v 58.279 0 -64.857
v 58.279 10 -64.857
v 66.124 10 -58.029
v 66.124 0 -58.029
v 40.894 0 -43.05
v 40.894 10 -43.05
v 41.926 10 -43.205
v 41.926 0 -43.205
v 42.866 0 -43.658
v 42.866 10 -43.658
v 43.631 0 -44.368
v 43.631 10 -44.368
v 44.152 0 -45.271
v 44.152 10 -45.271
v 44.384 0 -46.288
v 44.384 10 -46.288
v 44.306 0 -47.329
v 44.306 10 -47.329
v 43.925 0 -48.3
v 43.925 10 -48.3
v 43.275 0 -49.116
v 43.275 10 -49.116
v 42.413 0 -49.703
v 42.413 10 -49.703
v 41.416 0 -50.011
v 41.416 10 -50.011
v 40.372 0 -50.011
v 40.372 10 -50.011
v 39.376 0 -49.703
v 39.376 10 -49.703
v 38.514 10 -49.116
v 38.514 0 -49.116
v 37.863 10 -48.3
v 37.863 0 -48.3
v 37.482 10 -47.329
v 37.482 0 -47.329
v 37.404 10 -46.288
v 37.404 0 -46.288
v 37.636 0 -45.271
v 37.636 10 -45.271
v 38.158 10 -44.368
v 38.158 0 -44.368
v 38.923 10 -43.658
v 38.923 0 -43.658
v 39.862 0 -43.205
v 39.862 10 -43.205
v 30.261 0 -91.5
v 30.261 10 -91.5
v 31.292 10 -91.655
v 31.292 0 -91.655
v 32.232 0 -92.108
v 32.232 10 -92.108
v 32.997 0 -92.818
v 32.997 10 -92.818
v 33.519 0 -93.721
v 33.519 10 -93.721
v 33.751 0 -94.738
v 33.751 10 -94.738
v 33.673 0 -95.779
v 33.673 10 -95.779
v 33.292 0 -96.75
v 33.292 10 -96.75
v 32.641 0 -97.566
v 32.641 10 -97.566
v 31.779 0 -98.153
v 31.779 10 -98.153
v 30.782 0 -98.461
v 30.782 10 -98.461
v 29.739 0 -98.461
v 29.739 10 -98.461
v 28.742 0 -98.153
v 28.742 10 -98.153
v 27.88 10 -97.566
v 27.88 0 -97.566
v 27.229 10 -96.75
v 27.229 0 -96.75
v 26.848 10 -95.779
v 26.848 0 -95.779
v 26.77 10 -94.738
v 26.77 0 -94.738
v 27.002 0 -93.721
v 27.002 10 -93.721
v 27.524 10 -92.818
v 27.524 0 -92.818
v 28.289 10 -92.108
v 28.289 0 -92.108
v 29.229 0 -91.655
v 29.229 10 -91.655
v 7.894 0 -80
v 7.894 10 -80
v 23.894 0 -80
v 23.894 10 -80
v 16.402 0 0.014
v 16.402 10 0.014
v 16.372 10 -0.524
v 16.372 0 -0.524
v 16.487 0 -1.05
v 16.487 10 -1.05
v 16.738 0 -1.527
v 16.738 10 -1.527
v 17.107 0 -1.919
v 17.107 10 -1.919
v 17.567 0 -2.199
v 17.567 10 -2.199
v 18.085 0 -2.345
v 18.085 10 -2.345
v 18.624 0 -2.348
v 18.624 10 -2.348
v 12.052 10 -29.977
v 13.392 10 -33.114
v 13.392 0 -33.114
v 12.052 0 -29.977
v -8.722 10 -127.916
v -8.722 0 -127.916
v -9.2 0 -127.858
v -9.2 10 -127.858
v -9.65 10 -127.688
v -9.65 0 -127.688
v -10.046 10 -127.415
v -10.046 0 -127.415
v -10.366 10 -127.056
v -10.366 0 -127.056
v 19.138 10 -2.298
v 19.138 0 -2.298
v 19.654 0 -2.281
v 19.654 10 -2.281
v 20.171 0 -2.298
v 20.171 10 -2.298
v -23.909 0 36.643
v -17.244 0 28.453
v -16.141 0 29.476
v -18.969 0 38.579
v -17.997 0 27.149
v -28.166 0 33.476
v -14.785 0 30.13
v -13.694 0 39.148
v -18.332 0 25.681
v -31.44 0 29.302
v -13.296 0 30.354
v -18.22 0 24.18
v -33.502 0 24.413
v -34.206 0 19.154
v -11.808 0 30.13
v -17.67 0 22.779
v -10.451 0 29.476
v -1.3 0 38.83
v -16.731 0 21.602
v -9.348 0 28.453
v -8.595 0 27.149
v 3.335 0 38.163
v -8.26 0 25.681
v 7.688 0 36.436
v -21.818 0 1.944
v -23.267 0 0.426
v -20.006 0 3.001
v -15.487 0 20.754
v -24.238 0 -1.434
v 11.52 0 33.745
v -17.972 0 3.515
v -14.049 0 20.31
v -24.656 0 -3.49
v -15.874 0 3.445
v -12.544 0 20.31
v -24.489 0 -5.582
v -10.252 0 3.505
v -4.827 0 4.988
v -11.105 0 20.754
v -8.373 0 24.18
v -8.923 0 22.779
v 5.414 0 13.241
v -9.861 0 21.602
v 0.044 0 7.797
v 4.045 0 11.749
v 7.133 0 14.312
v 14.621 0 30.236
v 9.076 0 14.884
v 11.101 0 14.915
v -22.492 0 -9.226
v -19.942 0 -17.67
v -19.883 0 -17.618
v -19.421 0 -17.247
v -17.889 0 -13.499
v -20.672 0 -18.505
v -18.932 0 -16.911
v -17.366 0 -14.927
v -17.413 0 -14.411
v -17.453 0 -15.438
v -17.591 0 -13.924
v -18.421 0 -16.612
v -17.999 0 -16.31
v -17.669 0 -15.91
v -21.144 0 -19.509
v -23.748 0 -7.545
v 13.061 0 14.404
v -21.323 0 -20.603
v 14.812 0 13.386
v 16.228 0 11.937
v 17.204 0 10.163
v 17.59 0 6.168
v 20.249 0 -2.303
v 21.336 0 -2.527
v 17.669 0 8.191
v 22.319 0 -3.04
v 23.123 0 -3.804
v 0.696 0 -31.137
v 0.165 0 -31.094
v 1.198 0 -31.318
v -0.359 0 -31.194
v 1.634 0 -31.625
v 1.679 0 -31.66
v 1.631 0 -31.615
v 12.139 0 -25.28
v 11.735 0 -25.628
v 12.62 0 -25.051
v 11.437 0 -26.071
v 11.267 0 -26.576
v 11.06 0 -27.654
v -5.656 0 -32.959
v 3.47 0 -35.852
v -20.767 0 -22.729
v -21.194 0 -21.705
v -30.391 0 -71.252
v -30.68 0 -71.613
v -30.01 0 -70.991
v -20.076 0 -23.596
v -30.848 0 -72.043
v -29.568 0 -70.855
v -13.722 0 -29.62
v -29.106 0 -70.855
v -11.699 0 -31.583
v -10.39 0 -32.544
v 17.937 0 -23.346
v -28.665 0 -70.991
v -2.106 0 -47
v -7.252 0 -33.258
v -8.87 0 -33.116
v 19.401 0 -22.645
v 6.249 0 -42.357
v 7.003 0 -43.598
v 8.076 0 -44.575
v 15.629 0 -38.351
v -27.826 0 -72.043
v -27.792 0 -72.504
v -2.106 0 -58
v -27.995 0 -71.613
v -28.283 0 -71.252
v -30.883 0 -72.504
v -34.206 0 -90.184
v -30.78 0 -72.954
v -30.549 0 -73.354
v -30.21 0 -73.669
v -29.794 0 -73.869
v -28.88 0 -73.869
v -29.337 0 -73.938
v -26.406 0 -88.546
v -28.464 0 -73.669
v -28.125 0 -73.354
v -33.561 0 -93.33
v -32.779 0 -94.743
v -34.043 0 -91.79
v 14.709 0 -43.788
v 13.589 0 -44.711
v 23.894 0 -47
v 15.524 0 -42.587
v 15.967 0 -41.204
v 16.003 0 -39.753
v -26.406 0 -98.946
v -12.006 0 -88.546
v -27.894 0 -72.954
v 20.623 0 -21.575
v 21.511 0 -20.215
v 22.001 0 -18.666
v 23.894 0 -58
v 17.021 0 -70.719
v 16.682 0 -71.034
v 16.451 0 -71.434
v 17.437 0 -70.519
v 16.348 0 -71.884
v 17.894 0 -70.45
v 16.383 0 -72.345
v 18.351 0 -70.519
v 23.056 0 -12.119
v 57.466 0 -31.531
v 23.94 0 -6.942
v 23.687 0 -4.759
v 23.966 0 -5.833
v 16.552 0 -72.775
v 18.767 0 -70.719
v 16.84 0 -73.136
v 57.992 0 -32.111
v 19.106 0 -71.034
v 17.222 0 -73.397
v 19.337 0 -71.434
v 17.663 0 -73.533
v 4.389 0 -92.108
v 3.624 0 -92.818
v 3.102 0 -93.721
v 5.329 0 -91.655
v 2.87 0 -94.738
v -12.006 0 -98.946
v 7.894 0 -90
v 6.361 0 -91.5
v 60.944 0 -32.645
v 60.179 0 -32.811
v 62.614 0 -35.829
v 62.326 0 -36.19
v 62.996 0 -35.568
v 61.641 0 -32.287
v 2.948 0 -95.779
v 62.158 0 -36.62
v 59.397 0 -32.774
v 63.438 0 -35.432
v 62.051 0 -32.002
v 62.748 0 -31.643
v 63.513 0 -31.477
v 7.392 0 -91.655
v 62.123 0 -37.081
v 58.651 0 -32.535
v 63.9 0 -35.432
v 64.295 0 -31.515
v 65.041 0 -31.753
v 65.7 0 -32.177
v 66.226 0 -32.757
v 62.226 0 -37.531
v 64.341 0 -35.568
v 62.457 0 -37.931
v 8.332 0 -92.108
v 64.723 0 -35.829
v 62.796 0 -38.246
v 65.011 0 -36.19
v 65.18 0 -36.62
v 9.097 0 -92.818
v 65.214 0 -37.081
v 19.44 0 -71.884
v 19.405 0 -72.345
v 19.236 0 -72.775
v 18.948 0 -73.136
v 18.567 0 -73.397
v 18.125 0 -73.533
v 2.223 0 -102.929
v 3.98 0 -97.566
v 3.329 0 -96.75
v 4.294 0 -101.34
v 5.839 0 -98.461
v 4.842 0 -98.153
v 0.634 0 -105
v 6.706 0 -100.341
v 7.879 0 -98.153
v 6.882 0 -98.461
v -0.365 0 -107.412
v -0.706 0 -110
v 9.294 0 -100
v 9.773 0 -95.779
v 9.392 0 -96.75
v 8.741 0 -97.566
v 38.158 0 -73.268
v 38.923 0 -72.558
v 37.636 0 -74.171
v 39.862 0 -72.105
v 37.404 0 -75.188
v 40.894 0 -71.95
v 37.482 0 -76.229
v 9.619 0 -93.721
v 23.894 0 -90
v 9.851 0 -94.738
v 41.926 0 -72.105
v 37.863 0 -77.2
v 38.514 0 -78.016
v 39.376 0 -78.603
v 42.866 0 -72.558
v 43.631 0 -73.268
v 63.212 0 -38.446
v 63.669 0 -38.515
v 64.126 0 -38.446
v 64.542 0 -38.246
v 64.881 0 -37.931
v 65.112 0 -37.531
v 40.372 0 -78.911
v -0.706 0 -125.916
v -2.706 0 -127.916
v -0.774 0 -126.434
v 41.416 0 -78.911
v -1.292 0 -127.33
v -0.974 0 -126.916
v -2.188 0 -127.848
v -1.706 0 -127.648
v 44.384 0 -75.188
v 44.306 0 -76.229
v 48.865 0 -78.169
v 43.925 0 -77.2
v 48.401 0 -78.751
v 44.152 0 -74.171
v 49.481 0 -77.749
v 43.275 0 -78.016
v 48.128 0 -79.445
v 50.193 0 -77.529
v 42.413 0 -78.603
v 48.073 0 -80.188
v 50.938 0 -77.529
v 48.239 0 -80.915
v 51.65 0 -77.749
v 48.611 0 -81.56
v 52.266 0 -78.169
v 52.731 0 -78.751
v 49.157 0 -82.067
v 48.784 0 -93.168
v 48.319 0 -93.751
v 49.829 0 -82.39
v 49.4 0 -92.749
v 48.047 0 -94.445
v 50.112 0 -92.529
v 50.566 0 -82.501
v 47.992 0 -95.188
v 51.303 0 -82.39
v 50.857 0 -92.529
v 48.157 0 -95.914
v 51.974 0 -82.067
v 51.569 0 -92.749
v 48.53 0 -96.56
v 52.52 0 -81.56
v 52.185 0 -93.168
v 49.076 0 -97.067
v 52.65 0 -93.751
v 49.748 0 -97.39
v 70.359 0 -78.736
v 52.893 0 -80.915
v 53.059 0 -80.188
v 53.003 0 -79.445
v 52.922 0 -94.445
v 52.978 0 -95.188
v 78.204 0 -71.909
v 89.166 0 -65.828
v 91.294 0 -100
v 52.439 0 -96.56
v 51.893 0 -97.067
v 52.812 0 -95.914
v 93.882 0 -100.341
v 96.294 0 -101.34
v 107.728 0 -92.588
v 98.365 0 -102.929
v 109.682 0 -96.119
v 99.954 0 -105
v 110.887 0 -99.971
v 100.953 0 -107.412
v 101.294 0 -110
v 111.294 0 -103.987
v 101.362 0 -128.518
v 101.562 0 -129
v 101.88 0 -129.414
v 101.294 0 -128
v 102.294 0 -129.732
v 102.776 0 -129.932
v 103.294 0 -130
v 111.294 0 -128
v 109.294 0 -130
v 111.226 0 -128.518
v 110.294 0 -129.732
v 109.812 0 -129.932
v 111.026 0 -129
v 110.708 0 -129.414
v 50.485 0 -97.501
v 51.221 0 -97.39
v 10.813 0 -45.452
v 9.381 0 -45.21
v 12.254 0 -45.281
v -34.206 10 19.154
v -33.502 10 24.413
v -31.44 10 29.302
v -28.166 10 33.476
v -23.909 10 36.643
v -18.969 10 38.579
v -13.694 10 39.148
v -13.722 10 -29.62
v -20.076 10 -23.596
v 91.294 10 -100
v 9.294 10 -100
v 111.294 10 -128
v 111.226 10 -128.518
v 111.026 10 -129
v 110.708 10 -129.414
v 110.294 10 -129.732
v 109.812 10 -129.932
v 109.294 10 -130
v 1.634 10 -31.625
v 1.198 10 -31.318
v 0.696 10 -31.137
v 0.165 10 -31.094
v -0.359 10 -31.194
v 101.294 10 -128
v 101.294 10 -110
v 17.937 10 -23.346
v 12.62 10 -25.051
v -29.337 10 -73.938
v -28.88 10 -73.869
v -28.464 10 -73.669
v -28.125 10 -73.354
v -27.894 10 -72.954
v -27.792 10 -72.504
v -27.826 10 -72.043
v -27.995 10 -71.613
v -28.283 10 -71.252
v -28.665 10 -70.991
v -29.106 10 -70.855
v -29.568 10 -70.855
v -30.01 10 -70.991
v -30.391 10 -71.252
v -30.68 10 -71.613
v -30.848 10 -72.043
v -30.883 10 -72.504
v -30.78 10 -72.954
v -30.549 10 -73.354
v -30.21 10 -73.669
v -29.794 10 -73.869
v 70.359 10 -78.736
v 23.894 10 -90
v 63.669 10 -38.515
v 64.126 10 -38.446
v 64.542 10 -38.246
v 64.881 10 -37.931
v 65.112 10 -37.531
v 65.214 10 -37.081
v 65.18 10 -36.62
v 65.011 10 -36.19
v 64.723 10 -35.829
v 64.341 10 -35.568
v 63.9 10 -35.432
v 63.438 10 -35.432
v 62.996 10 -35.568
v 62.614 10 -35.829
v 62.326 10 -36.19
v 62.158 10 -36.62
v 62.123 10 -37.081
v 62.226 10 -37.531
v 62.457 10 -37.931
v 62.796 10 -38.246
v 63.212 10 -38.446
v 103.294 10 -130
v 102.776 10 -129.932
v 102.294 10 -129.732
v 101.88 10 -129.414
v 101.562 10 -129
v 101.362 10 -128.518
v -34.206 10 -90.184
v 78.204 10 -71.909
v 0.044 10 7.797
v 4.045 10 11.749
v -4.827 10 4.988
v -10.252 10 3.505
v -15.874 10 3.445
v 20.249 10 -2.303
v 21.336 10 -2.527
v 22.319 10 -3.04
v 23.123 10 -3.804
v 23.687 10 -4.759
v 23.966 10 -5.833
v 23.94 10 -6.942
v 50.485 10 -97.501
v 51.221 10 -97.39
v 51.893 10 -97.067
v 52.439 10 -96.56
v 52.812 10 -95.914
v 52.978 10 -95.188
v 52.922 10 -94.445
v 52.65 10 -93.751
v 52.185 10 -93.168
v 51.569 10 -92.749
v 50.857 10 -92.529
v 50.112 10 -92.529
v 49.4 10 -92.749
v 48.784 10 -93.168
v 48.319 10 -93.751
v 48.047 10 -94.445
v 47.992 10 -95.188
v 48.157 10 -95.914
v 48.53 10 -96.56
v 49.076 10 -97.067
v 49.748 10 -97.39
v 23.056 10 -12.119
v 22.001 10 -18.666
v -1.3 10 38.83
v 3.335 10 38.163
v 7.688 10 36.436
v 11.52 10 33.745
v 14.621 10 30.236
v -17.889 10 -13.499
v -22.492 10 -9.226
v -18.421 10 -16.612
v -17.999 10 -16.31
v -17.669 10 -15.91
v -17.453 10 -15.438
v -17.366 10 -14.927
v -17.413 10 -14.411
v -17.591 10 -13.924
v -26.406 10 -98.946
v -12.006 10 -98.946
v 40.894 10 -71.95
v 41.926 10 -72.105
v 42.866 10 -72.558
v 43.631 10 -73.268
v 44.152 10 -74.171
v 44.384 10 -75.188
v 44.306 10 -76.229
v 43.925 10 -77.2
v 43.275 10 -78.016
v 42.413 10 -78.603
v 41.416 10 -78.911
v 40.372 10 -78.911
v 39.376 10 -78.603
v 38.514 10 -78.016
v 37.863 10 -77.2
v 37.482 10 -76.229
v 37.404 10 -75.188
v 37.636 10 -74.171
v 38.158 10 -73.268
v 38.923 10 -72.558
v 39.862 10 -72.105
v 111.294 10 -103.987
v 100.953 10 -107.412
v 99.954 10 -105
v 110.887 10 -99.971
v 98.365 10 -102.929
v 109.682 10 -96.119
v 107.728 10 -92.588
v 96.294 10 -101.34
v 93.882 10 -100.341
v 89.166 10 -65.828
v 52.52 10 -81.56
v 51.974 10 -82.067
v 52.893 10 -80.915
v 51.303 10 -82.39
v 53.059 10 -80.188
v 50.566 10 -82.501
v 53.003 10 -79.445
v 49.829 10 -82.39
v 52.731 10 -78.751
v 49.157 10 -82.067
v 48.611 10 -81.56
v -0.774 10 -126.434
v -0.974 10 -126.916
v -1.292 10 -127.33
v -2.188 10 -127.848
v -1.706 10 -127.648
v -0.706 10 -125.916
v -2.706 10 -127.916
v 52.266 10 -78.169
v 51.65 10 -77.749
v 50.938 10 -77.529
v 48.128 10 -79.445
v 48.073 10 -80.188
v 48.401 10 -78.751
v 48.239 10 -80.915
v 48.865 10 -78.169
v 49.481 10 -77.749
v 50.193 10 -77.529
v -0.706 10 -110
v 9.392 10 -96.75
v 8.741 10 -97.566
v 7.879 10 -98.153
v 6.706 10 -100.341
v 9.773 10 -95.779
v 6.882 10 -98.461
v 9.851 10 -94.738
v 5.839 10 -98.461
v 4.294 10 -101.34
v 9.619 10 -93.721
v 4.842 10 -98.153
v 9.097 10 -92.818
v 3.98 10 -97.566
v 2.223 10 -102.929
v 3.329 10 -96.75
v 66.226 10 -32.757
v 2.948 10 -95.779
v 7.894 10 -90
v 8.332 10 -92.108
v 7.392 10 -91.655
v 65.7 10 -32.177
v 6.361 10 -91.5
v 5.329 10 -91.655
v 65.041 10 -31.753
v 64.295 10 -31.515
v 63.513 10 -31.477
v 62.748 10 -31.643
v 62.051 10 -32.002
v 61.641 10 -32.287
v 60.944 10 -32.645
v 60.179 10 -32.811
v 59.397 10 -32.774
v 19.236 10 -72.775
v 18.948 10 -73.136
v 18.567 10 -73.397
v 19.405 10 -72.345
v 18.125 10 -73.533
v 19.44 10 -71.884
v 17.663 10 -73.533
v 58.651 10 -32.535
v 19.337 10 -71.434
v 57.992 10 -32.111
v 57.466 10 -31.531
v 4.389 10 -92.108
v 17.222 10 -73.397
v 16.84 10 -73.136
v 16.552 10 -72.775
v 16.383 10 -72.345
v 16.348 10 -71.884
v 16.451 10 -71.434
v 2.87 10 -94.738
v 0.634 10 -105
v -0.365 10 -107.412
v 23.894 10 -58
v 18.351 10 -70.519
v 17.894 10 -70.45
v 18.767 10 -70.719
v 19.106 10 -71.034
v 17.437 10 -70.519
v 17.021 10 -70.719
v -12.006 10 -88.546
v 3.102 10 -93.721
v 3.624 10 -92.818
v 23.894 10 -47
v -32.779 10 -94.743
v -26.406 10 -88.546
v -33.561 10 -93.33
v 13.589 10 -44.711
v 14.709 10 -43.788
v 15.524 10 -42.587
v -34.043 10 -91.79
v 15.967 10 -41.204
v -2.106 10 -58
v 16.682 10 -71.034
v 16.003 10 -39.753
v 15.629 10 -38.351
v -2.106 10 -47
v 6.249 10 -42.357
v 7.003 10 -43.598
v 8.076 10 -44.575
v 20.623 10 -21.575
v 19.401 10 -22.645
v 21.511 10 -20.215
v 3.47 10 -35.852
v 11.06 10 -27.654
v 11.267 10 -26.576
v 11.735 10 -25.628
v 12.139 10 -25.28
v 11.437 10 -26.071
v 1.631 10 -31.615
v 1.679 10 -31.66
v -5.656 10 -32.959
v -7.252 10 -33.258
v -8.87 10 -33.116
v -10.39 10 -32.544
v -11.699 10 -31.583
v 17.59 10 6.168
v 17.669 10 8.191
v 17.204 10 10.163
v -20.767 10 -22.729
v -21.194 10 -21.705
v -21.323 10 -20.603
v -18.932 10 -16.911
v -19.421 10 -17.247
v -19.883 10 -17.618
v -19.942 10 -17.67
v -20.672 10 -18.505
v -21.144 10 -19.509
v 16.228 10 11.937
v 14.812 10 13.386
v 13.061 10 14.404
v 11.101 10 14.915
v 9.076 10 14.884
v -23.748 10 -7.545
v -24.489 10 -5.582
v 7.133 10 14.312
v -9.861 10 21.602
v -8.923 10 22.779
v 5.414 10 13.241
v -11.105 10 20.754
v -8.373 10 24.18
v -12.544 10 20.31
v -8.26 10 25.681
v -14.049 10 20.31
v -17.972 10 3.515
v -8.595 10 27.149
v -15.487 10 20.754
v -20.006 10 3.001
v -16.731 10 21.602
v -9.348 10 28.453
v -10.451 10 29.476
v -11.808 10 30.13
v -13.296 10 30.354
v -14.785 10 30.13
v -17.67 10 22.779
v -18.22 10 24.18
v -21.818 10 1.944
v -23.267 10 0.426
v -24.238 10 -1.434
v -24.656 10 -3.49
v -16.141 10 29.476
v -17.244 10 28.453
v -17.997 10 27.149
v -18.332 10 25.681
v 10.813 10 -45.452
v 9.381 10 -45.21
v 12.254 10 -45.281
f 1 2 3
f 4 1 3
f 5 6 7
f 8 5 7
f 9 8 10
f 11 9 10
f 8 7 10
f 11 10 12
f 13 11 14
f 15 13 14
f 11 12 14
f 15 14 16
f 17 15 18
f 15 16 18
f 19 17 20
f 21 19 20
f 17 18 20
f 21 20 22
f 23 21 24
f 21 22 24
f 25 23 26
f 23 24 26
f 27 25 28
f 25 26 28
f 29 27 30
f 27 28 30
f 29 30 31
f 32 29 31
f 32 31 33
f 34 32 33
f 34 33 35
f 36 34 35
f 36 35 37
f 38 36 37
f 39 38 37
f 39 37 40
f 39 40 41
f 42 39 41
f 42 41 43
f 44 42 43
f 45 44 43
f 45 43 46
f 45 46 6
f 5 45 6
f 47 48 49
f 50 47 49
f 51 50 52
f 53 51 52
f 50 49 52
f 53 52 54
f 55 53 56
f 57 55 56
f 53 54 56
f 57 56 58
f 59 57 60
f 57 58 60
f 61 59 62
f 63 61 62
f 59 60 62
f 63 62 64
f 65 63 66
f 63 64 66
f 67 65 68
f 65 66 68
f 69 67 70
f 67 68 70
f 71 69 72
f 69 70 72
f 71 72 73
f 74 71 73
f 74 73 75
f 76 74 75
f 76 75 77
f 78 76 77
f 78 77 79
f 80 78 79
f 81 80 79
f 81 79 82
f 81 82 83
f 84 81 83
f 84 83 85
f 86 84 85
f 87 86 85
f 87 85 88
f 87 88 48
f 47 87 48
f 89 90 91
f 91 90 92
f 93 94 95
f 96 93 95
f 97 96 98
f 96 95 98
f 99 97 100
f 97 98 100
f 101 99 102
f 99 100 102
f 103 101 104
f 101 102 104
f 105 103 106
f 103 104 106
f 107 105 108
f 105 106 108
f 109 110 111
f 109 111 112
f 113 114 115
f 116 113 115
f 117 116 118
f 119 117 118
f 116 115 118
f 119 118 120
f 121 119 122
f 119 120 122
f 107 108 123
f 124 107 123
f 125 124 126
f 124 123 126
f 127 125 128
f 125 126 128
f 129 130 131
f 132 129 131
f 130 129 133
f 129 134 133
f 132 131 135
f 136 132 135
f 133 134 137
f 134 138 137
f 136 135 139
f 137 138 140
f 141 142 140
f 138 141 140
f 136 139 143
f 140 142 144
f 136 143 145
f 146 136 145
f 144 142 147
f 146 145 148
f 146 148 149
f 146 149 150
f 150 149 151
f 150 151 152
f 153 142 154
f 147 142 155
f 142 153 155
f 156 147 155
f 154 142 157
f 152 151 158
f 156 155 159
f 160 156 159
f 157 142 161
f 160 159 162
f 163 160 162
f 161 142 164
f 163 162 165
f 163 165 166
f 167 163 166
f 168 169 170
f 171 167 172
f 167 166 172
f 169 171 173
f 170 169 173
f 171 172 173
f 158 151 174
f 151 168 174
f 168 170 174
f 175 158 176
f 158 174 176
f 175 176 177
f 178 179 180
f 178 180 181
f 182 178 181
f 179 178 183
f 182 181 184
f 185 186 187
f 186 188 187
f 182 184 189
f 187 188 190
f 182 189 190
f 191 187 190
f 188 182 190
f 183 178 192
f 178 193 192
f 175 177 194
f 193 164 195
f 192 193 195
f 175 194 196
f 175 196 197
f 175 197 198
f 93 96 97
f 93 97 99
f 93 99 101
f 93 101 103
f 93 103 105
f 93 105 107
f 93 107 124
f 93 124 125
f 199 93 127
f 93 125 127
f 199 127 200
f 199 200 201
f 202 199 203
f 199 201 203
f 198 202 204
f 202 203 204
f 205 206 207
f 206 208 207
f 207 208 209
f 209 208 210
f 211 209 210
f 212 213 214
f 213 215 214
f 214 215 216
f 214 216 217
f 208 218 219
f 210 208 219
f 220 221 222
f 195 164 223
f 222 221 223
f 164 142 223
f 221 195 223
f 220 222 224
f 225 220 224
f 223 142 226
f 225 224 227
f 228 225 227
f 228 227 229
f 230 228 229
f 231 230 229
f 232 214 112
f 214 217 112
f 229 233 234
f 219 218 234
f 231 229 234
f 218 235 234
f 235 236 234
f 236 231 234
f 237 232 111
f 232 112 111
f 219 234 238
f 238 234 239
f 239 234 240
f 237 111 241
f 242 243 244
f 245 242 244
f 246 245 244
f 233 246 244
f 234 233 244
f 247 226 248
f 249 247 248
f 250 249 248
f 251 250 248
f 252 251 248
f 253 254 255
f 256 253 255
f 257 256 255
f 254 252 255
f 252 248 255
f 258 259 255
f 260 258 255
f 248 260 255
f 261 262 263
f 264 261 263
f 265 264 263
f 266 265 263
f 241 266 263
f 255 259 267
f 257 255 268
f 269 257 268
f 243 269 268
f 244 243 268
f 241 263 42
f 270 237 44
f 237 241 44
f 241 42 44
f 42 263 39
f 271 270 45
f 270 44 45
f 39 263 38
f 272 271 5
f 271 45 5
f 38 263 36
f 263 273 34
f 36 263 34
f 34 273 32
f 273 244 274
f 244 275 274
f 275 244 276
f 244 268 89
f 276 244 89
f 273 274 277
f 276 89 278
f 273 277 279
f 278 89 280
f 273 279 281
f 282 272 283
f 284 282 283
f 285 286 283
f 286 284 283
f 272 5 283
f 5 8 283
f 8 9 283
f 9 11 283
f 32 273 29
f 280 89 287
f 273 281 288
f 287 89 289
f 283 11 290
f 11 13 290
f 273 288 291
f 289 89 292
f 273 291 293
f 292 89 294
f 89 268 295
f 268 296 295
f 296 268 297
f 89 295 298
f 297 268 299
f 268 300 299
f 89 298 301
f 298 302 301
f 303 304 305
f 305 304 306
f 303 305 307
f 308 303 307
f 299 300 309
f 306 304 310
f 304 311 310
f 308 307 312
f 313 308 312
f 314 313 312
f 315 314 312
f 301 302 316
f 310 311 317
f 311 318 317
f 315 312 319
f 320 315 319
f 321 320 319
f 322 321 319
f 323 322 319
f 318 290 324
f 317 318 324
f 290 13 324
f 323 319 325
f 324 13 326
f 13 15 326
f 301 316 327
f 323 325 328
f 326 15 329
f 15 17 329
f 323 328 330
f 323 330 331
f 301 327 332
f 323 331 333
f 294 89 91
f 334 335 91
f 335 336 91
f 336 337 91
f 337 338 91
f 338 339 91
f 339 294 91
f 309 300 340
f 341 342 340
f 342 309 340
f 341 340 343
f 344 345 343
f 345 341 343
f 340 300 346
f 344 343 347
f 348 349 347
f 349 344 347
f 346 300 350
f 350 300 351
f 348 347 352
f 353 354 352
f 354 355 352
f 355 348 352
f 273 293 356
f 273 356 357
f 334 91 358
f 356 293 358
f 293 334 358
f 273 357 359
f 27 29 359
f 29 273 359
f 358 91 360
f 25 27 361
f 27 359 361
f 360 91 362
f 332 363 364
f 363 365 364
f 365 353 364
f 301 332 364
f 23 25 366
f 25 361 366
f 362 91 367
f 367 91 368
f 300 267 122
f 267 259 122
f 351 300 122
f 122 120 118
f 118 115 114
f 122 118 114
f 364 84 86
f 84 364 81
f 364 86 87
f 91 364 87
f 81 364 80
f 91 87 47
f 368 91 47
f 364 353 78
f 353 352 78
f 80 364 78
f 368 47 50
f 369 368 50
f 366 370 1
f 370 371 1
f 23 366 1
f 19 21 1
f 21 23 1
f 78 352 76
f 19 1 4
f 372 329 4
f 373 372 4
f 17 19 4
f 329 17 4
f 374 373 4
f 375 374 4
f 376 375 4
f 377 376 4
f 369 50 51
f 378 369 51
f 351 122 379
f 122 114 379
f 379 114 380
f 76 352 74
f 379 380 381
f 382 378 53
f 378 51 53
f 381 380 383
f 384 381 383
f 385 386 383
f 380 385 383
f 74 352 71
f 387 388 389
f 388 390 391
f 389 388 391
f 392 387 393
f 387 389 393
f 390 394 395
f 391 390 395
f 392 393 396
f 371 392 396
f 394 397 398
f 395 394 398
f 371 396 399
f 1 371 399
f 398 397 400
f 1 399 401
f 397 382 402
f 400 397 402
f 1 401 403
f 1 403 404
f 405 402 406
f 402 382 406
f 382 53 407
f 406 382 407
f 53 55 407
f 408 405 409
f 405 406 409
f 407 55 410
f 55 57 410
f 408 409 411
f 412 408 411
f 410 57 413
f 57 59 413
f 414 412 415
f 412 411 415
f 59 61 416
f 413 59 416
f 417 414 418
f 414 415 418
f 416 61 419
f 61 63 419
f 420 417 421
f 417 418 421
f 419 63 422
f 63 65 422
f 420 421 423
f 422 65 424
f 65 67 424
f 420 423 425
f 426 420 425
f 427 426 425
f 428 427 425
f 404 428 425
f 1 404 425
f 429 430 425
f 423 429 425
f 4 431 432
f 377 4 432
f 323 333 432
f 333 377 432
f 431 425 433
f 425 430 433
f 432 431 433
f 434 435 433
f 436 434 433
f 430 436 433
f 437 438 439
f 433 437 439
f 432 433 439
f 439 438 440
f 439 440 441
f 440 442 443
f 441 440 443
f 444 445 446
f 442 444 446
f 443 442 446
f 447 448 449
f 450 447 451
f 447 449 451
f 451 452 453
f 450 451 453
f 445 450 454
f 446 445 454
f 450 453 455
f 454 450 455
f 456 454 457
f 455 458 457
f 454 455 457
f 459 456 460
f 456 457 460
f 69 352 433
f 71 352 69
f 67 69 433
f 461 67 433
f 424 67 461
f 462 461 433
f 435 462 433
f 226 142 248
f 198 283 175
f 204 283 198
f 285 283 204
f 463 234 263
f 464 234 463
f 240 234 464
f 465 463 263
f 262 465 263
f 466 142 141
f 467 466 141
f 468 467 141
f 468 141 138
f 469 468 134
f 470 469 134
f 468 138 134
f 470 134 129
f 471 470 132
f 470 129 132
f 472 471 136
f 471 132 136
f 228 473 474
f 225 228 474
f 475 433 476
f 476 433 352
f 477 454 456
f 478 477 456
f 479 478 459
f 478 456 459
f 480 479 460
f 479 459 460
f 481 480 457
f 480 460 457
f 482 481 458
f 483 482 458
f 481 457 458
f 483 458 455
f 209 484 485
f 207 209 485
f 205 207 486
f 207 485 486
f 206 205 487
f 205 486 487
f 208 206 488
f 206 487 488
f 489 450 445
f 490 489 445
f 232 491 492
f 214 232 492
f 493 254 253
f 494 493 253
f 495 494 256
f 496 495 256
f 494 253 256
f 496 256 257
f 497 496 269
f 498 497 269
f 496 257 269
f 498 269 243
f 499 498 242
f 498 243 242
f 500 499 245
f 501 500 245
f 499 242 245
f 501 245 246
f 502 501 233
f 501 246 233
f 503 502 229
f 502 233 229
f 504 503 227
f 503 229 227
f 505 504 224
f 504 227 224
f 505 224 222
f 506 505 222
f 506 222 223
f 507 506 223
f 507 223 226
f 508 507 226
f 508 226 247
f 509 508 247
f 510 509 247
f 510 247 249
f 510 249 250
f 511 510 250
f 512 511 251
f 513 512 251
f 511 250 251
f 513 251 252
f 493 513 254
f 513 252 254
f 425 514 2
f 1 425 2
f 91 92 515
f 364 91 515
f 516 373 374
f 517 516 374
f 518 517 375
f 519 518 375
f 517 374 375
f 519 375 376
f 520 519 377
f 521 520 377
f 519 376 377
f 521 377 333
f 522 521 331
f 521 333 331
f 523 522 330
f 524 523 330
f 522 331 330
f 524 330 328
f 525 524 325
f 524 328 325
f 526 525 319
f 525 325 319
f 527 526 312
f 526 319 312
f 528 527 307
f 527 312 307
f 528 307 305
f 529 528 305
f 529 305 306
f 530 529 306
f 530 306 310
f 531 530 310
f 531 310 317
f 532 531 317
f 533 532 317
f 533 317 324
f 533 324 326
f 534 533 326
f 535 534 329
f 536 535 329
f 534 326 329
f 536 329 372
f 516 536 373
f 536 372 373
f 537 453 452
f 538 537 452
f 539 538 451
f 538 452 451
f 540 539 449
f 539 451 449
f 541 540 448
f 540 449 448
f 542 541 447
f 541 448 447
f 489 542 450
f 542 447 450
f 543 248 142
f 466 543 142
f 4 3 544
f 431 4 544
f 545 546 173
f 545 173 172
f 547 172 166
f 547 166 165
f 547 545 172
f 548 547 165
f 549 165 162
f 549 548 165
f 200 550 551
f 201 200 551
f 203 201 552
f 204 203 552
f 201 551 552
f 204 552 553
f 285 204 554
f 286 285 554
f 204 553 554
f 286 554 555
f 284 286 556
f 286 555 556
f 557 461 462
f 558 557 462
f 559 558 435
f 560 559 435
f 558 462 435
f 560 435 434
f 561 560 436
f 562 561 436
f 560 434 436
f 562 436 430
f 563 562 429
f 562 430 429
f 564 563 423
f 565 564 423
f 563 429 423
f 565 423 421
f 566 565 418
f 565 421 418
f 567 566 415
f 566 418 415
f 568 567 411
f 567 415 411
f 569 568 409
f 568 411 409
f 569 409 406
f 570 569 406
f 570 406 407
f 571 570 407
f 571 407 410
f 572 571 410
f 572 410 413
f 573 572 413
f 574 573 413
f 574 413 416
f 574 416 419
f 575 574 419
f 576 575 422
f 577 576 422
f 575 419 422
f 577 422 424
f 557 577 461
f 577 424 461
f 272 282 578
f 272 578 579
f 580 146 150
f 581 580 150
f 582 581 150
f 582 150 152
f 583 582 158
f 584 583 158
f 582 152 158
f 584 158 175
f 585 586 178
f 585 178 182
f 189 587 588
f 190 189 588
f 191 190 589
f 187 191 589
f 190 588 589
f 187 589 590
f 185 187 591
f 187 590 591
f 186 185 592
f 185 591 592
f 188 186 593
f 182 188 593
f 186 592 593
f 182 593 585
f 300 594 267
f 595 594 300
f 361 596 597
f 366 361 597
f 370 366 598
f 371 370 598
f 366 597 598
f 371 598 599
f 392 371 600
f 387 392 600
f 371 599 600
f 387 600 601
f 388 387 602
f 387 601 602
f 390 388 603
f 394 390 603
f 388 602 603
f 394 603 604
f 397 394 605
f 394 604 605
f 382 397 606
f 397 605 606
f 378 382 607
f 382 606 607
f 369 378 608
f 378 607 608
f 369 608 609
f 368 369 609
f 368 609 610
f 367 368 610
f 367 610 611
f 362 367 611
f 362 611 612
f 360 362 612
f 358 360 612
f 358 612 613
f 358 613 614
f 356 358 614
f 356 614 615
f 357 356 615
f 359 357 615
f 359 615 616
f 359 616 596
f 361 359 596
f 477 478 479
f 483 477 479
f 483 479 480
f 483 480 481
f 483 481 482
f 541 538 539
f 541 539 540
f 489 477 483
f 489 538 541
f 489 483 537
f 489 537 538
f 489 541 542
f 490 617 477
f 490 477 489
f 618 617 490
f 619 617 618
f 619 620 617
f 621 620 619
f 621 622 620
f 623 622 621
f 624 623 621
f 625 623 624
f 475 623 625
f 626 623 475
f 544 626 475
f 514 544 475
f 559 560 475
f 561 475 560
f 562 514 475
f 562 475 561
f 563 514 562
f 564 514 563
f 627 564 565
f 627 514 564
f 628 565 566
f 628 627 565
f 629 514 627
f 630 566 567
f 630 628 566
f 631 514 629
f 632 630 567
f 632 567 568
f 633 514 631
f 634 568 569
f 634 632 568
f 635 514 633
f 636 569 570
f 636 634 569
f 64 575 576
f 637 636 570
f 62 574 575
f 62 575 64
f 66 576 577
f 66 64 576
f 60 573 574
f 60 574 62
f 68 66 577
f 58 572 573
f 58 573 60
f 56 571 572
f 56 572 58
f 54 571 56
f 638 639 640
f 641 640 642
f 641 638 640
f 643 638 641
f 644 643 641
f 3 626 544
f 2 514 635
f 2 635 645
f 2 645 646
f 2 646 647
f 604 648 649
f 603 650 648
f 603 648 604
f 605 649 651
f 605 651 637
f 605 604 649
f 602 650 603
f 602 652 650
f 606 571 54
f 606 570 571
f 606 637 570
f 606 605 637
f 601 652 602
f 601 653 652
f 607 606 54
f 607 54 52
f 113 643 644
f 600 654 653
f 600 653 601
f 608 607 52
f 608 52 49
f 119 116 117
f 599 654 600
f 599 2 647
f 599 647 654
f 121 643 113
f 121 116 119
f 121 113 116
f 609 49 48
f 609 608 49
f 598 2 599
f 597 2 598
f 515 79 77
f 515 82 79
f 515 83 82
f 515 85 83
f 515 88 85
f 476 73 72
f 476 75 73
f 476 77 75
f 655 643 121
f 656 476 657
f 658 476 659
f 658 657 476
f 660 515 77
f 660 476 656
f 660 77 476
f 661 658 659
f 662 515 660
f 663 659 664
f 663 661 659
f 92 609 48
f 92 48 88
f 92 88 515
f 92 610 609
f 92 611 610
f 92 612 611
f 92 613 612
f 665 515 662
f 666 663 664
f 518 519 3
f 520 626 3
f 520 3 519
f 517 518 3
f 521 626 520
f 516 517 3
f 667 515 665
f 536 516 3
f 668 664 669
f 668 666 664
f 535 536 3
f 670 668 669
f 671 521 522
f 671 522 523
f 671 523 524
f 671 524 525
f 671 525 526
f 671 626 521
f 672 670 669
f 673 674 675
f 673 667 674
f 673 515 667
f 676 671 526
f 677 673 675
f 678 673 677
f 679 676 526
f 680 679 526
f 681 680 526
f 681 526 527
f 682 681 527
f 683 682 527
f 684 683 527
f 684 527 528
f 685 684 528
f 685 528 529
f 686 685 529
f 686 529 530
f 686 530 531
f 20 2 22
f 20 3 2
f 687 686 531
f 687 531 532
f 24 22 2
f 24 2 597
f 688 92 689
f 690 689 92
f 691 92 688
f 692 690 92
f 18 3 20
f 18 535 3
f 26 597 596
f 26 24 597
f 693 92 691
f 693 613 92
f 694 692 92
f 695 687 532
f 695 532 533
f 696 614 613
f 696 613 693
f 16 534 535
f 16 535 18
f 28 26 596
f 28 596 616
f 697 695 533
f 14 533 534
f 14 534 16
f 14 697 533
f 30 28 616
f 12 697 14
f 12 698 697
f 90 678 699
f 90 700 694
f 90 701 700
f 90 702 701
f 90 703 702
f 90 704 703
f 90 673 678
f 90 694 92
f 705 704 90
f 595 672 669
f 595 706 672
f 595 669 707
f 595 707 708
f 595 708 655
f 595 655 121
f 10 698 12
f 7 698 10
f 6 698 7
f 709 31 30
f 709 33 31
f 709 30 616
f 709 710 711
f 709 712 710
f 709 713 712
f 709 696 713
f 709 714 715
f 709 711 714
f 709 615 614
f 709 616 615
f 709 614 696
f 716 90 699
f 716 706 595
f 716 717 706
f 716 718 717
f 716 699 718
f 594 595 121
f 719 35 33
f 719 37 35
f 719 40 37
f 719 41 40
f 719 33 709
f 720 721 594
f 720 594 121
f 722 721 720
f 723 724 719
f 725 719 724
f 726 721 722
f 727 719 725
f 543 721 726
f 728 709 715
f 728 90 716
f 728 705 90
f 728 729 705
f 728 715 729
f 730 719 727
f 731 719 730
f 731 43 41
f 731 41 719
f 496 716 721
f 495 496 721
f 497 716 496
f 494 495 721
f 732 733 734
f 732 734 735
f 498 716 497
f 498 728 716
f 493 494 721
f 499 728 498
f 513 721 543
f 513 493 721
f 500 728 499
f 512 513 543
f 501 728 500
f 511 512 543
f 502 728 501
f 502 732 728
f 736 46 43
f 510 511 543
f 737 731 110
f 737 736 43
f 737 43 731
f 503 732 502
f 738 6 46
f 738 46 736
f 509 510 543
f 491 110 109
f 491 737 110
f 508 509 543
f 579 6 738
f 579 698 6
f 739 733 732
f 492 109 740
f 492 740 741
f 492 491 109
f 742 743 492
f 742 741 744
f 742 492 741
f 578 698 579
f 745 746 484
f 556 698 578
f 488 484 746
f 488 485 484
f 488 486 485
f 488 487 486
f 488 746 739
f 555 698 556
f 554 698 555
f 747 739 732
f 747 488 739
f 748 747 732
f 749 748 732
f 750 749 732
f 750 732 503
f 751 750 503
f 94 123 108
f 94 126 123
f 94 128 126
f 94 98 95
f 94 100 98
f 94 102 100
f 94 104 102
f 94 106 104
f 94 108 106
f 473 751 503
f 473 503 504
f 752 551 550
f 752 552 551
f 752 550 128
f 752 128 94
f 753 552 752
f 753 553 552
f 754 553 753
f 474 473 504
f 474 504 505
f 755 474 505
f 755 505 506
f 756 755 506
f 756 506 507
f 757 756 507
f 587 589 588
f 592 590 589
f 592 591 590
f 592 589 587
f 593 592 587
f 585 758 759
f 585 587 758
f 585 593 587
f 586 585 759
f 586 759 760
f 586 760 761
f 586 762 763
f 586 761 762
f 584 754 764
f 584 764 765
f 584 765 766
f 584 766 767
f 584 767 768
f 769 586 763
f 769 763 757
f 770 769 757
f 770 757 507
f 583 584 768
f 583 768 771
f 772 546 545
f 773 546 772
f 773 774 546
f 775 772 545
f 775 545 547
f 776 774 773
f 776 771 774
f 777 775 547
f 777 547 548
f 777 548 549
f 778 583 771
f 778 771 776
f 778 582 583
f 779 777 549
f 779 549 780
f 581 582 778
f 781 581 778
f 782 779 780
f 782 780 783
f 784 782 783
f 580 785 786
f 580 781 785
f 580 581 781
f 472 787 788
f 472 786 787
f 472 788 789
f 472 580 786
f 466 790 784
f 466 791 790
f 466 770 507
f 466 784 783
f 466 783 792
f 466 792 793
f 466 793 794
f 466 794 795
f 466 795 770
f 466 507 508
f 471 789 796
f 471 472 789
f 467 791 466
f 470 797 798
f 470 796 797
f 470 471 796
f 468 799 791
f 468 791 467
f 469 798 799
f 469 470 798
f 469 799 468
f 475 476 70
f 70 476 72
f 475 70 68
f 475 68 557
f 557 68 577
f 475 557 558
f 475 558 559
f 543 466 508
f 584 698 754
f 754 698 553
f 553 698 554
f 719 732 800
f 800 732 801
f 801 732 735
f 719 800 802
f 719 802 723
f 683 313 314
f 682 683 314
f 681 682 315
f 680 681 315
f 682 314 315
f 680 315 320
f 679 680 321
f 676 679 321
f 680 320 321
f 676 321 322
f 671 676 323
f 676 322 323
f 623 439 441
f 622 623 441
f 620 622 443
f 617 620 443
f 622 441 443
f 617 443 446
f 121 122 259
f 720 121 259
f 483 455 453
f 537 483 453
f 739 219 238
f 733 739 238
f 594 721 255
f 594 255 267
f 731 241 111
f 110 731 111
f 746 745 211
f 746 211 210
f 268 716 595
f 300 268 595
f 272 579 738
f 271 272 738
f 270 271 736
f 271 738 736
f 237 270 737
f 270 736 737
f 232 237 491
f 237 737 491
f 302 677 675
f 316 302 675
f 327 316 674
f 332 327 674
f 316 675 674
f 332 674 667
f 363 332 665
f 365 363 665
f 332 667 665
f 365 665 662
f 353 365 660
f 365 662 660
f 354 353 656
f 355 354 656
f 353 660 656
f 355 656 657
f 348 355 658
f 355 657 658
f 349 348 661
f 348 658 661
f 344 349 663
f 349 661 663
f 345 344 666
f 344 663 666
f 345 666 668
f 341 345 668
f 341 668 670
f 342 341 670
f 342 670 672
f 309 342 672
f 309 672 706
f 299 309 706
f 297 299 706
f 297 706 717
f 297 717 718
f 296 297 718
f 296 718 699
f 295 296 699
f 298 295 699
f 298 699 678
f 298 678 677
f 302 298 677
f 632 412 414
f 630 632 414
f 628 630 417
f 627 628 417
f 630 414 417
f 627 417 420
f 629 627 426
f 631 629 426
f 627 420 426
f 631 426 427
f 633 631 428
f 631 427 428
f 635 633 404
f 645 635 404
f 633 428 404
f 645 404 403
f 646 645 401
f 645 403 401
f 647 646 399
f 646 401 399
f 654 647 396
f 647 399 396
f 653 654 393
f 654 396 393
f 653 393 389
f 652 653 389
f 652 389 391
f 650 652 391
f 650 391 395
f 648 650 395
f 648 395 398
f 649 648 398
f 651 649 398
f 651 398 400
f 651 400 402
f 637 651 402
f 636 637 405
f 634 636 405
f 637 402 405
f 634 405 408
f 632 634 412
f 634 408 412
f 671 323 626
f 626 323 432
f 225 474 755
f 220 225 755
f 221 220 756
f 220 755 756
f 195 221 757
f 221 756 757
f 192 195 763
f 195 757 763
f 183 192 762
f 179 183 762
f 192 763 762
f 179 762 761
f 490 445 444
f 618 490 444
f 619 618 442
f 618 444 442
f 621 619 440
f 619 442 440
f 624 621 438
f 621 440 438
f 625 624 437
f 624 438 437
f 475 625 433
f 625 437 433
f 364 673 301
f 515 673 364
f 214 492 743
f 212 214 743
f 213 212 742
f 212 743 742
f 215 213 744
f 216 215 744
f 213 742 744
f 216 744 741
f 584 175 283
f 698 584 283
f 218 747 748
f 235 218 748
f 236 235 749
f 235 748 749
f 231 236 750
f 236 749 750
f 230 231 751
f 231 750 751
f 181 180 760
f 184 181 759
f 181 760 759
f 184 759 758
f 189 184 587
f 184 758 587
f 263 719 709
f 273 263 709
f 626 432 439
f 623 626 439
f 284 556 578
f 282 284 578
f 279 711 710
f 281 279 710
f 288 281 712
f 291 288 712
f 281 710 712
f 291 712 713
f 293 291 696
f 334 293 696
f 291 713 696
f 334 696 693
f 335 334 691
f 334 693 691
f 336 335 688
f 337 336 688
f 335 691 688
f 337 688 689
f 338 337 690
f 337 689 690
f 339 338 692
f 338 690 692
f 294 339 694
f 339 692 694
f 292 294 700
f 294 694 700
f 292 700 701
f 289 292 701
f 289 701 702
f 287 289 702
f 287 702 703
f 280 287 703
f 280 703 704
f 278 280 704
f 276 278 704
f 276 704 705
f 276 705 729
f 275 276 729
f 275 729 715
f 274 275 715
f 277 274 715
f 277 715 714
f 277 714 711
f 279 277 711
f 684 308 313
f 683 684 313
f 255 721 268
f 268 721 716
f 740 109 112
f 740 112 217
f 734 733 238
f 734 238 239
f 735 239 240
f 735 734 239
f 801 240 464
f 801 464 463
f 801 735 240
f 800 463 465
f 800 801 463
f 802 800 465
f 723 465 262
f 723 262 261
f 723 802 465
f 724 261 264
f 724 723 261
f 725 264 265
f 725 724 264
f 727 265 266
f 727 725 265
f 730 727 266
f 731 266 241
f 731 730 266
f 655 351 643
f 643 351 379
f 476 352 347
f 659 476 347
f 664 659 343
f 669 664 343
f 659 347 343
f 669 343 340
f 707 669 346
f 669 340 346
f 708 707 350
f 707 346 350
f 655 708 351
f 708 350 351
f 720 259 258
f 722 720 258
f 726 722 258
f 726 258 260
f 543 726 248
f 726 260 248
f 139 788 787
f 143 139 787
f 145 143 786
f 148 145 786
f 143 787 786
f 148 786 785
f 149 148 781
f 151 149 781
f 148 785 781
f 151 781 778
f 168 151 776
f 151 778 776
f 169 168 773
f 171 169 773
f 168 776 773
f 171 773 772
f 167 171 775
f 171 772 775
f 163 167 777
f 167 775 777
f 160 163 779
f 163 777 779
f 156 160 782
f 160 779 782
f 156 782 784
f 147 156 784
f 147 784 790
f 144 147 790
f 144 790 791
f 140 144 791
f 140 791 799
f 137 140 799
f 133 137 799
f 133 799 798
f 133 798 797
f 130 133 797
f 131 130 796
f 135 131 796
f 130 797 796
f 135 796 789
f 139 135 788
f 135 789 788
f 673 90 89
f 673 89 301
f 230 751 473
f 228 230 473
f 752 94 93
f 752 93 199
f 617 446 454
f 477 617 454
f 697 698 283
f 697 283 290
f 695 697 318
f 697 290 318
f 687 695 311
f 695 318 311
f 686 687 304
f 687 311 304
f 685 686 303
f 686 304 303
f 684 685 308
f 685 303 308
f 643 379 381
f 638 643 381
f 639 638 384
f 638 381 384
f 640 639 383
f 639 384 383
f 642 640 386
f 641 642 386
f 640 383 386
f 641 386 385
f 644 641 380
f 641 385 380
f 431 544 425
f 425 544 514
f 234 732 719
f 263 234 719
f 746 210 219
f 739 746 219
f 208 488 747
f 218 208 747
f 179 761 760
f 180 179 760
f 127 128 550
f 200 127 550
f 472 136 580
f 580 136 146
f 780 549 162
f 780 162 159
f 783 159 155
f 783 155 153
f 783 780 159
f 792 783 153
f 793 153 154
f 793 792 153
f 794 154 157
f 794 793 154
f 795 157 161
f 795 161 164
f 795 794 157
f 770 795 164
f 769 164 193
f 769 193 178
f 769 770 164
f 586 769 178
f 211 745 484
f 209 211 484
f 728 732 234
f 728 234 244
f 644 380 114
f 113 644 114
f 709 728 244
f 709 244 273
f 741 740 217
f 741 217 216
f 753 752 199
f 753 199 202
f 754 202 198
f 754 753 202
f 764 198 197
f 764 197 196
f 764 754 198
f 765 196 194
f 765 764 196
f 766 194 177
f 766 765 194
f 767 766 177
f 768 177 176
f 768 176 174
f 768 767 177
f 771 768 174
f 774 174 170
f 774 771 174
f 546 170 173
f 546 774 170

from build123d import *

# Parameters (mm, degrees)
DODANIE_WYCI_GNI_CIE1_DEPTH = 10
SZKIC5_R                    = 5.05
WYTNIJ_WYCI_GNI_CIE1_DEPTH  = 10
SZKIC9_R                    = 1.55
SZKIC9_W                    = 26
SZKIC9_H                    = 11
SZKIC9_W_2                  = 16
SZKIC9_H_2                  = 10
WYTNIJ_WYCI_GNI_CIE3_DEPTH  = 172.424567808
SZKIC13_R                   = 3.5
WYTNIJ_WYCI_GNI_CIE5_DEPTH  = 172.424567808
SZKIC19_W                   = 14.4
SZKIC19_H                   = 10.4
WYTNIJ_WYCI_GNI_CIE7_DEPTH  = 172.424567808
SZKIC20_R                   = 1.550000003
WYTNIJ_WYCI_GNI_CIE8_DEPTH  = 10
WYTNIJ_WYCI_GNI_CIE10_DEPTH = 10
WYTNIJ_WYCI_GNI_CIE11_DEPTH = 10
DODANIE_WYCI_GNI_CIE4_DEPTH = 10
SZKIC22_R                   = 1.55
WYTNIJ_WYCI_GNI_CIE9_DEPTH  = 10
WYTNIJ_WYCI_GNI_CIE6_DEPTH  = 172.424567808
WYTNIJ_WYCI_GNI_CIE12_DEPTH = 10
SZKIC30_R                   = 2.5
WYTNIJ_WYCI_GNI_CIE13_DEPTH = 10
WYTNIJ_WYCI_GNI_CIE14_DEPTH = 10


with BuildPart() as part:
    # Szkic2 → Dodanie-wyciągnięcie1 (new body)
    with BuildSketch(Plane(origin=(0, 0, 0), x_dir=(1, 0, 0), z_dir=(0, 1, 0))):
        with BuildLine():
            Line((-2.705874152, 127.916025413), (-8.705874152, 127.916025413))
            Line((-8.705874152, 127.916025413), (-8.722327105, 127.916025413))
            ThreePointArc((-8.722327105, 127.916025413), (-9.649740147, 127.688003136), (-10.365682355, 127.055930463))
            Line((-10.365682355, 127.055930463), (-32.779295153, 94.743126616))
            ThreePointArc((-32.779295153, 94.743126616), (-33.840904211, 92.57229607), (-34.205874152, 90.183506419))
            Line((-34.205874152, 90.183506419), (-34.205874152, -19.154356935))
            ThreePointArc((-34.205874152, -19.154356935), (-28.165753637, -33.476429577), (-13.693697675, -39.147797741))
            Line((-13.693697675, -39.147797741), (-2.713579886, -35.93445679))
            Line((-2.713579886, -35.93445679), (55.027168237, 21.545915465))
            ThreePointArc((55.027168237, 21.545915465), (56.334805154, 23.495770338), (56.794125848, 25.798132784))
            Line((56.794125848, 25.798132784), (56.794125848, 59.333926751))
            ThreePointArc((56.794125848, 59.333926751), (64.677605901, 81.048439594), (85.935948442, 90.090131813))
            Line((85.935948442, 90.090131813), (91.371133341, 90.090131813))
            ThreePointArc((91.371133341, 90.090131813), (105.458816444, 95.925441216), (111.294125848, 110.013124319))
            Line((111.294125848, 110.013124319), (111.294125848, 118.285035843))
            Line((111.294125848, 118.285035843), (111.294125848, 128))
            ThreePointArc((111.294125848, 128), (110.70833941, 129.414213562), (109.294125848, 130))
            Line((109.294125848, 130), (103.294125848, 130))
            ThreePointArc((103.294125848, 130), (101.879912285, 129.414213562), (101.294125848, 128))
            Line((101.294125848, 128), (101.294125848, 118.285035843))
            Line((101.294125848, 118.285035843), (101.294125848, 110))
            ThreePointArc((101.294125848, 110), (98.36519366, 102.928932188), (91.294125848, 100))
            Line((91.294125848, 100), (9.294125848, 100))
            ThreePointArc((9.294125848, 100), (2.223058036, 102.928932188), (-0.705874152, 110))
            Line((-0.705874152, 110), (-0.705874152, 125.916025413))
            ThreePointArc((-0.705874152, 125.916025413), (-1.291660589, 127.330238976), (-2.705874152, 127.916025413))
        make_face()
    extrude(amount=DODANIE_WYCI_GNI_CIE1_DEPTH)

    # Szkic5 → Wytnij-wyciągnięcie1 (cut)
    with BuildSketch(Plane(origin=(0, 10, 0), x_dir=(1, 0, 0), z_dir=(0, 1, 0))):
        with Locations(Location((-13.29618586, -25.303913492, 0), (0, 0, 270))):
            Circle(SZKIC5_R)
    extrude(amount=-WYTNIJ_WYCI_GNI_CIE1_DEPTH, mode=Mode.SUBTRACT)

    # Szkic9 → Wytnij-wyciągnięcie3 (cut, through all)
    with BuildSketch(Plane(origin=(0, 10, 0), x_dir=(1, 0, 0), z_dir=(0, 1, 0))):
        with Locations(Location((17.894125848, 72, 0), (0, 0, 270))):
            Circle(SZKIC9_R)
        with Locations((10.894125848, 52.5)):
            Rectangle(SZKIC9_W, SZKIC9_H)
        with Locations((15.894125848, 85)):
            Rectangle(SZKIC9_W_2, SZKIC9_H_2)
    extrude(amount=-WYTNIJ_WYCI_GNI_CIE3_DEPTH, mode=Mode.SUBTRACT)

    # Szkic13 → Wytnij-wyciągnięcie5 (cut, through all)
    with BuildSketch(Plane(origin=(0, 10, 0), x_dir=(1, 0, 0), z_dir=(0, 1, 0))):
        with Locations(Location((40.894125848, 75.45, 0), (0, 0, 270))):
            Circle(SZKIC13_R)
        with Locations(Location((40.894125848, 46.55, 0), (0, 0, 270))):
            Circle(SZKIC13_R)
        with Locations(Location((30.260526653, 95, 0), (0, 0, 270))):
            Circle(SZKIC13_R)
        with Locations(Location((6.36054282, 95, 0), (0, 0, 270))):
            Circle(SZKIC13_R)
    extrude(amount=-WYTNIJ_WYCI_GNI_CIE5_DEPTH, mode=Mode.SUBTRACT)

    # Szkic19 → Wytnij-wyciągnięcie7 (cut, through all)
    with BuildSketch(Plane(origin=(0, 10, 0), x_dir=(1, 0, 0), z_dir=(0, 1, 0))):
        with Locations((-19.205874152, 93.746086503)):
            Rectangle(SZKIC19_W, SZKIC19_H)
    extrude(amount=-WYTNIJ_WYCI_GNI_CIE7_DEPTH, mode=Mode.SUBTRACT)

    # Szkic20 → Wytnij-wyciągnięcie8 (cut)
    with BuildSketch(Plane.XZ):
        with Locations(Location((-29.337186678, -72.387878862, 0), (0, 0, 270))):
            Circle(SZKIC20_R)
    extrude(amount=-WYTNIJ_WYCI_GNI_CIE8_DEPTH, mode=Mode.SUBTRACT)

    # Szkic23 → Wytnij-wyciągnięcie10 (cut)
    with BuildSketch(Plane(origin=(0, 10, 0), x_dir=(1, 0, 0), z_dir=(0, 1, 0))):
        with BuildLine():
            Line((15.628724602, 38.350669498), (8.597420665, 21.889479841))
            Line((8.597420665, 21.889479841), (-0.782698582, 25.896144654))
            Line((-0.782698582, 25.896144654), (6.248605356, 42.357334312))
            ThreePointArc((6.248605356, 42.357334312), (12.941997386, 45.044061528), (15.628724602, 38.350669498))
        make_face()
    extrude(amount=-WYTNIJ_WYCI_GNI_CIE10_DEPTH, mode=Mode.SUBTRACT)

    # Szkic25 → Wytnij-wyciągnięcie11 (cut)
    with BuildSketch(Plane(origin=(0, 10, 0), x_dir=(1, 0, 0), z_dir=(0, 1, 0))):
        with BuildLine():
            Line((1.679385524, 31.66020119), (3.469714538, 35.85159239))
            Line((3.469714538, 35.85159239), (3.704708682, 36.109613041))
            ThreePointArc((3.704708682, 36.109613041), (9.518980065, 39.386499344), (13.410780858, 33.964541935))
            Line((13.410780858, 33.964541935), (13.39199801, 33.114203976))
            Line((13.39199801, 33.114203976), (12.051775457, 29.976570072))
            Line((12.051775457, 29.976570072), (11.05950477, 27.653536376))
            Line((11.05950477, 27.653536376), (17.589964961, -6.167500607))
            ThreePointArc((17.589964961, -6.167500607), (13.061179445, -14.403704543), (4.044681841, -11.748949479))
            ThreePointArc((4.044681841, -11.748949479), (-4.827370085, -4.988355381), (-15.874459375, -3.445385461))
            ThreePointArc((-15.874459375, -3.445385461), (-23.818044234, 0.469833912), (-22.492396316, 9.226096856))
            Line((-22.492396316, 9.226096856), (1.679385524, 31.66020119))
        make_face()
    extrude(amount=-WYTNIJ_WYCI_GNI_CIE11_DEPTH, mode=Mode.SUBTRACT)

    # Szkic27 → Dodanie-wyciągnięcie4 (add)
    with BuildSketch(Plane.XZ):
        with BuildLine():
            Line((111.294125848, -110.013124319), (91.371133341, -90.090131813))
            Line((91.371133341, -90.090131813), (85.935948442, -90.090131813))
            ThreePointArc((85.935948442, -90.090131813), (64.677605901, -81.048439594), (56.794125848, -59.333926751))
            Line((56.794125848, -59.333926751), (56.794125848, -25.798132784))
            Line((56.794125848, -25.798132784), (55.027168237, -21.545915465))
            Line((55.027168237, -21.545915465), (-2.713579886, 35.93445679))
            Line((-2.713579886, 35.93445679), (-13.693697675, 39.147797741))
            Line((-13.693697675, 39.147797741), (7.831109821, 38.596391899))
            ThreePointArc((7.831109821, 38.596391899), (16.200857661, 35.992910672), (22.653502952, 30.060443886))
            Line((22.653502952, 30.060443886), (62.775344571, -27.781601032))
            Line((62.775344571, -27.781601032), (89.166132073, -65.828137643))
            Line((89.166132073, -65.828137643), (107.72767835, -92.58757216))
            ThreePointArc((107.72767835, -92.58757216), (110.381700996, -98.014648527), (111.294125848, -103.986622655))
            Line((111.294125848, -103.986622655), (111.294125848, -110.013124319))
        make_face()
    extrude(amount=-DODANIE_WYCI_GNI_CIE4_DEPTH)

    # Szkic22 → Wytnij-wyciągnięcie9 (cut)
    with BuildSketch(Plane.XZ):
        with Locations(Location((63.668699874, -36.964909883, 0), (0, 0, 270))):
            Circle(SZKIC22_R)
    extrude(amount=-WYTNIJ_WYCI_GNI_CIE9_DEPTH, mode=Mode.SUBTRACT)

    # Szkic17 → Wytnij-wyciągnięcie6 (cut, through all)
    with BuildSketch(Plane(origin=(0, 10, 0), x_dir=(1, 0, 0), z_dir=(0, 1, 0))):
        Polygon((66.124221849, 58.029118396), (78.203911754, 71.908638986), (70.358965334, 78.736289802), (58.279275429, 64.856769212), align=None)
    extrude(amount=-WYTNIJ_WYCI_GNI_CIE6_DEPTH, mode=Mode.SUBTRACT)

    # Szkic28 → Wytnij-wyciągnięcie12 (cut)
    with BuildSketch(Plane(origin=(0, 10, 0), x_dir=(1, 0, 0), z_dir=(0, 1, 0))):
        with BuildLine():
            Line((11.26748333, 26.576422306), (10.066738772, 23.271111531))
            Line((10.066738772, 23.271111531), (13.650053515, 4.713243184))
            Line((13.650053515, 4.713243184), (14.443246416, -0.151068703))
            Line((14.443246416, -0.151068703), (16.401806069, -0.01406507))
            ThreePointArc((16.401806069, -0.01406507), (16.908780733, 1.735462564), (18.624084966, 2.348326041))
            ThreePointArc((18.624084966, 2.348326041), (19.396162916, 2.285491306), (20.170698513, 2.297622868))
            Line((20.170698513, 2.297622868), (20.24930544, 2.302668096))
            ThreePointArc((20.24930544, 2.302668096), (23.123159184, 3.803925799), (23.940405993, 6.941586981))
            Line((23.940405993, 6.941586981), (23.056429184, 12.118910521))
            Line((23.056429184, 12.118910521), (22.000864003, 18.666304586))
            ThreePointArc((22.000864003, 18.666304586), (20.623069051, 21.574602066), (17.93652414, 23.346321457))
            Line((17.93652414, 23.346321457), (12.620467249, 25.051129714))
            ThreePointArc((12.620467249, 25.051129714), (11.735014139, 25.628420704), (11.26748333, 26.576422306))
        make_face()
        with BuildLine():
            Line((-0.358990635, 31.193922826), (-5.655504297, 32.95851204))
            ThreePointArc((-5.655504297, 32.95851204), (-8.869808875, 33.115862726), (-11.699467807, 31.583040659))
            Line((-11.699467807, 31.583040659), (-13.721552832, 29.619702325))
            Line((-13.721552832, 29.619702325), (-20.075654798, 23.596300827))
            ThreePointArc((-20.075654798, 23.596300827), (-21.322767717, 20.6033893), (-19.942342747, 17.669580012))
            Line((-19.942342747, 17.669580012), (-19.882798357, 17.618014821))
            ThreePointArc((-19.882798357, 17.618014821), (-19.179679353, 17.074421967), (-18.420602931, 16.612174728))
            ThreePointArc((-18.420602931, 16.612174728), (-17.380074633, 15.099249316), (-18.012101151, 13.375246728))
            Line((-18.012101151, 13.375246728), (-18.878230506, 12.580445054))
            Line((-18.878230506, 12.580445054), (-17.460533124, 11.447059157))
            Line((-17.460533124, 11.447059157), (-13.203312435, 15.39161053))
            Line((-13.203312435, 15.39161053), (0.650139771, 28.249156335))
            Line((0.650139771, 28.249156335), (1.63370973, 31.625464518))
            ThreePointArc((1.63370973, 31.625464518), (0.696479646, 31.136698863), (-0.358990635, 31.193922826))
        make_face()
    extrude(amount=-WYTNIJ_WYCI_GNI_CIE12_DEPTH, mode=Mode.SUBTRACT)

    # Szkic30 → Wytnij-wyciągnięcie13 (cut)
    with BuildSketch(Plane.XZ):
        with Locations(Location((50.565790387, -80.001305931, 0), (0, 0, 270))):
            Circle(SZKIC30_R)
        with Locations(Location((50.48451947, -95.001085764, 0), (0, 0, 270))):
            Circle(SZKIC30_R)
    extrude(amount=-WYTNIJ_WYCI_GNI_CIE13_DEPTH, mode=Mode.SUBTRACT)

    # Szkic31 → Wytnij-wyciągnięcie14 (cut)
    with BuildSketch(Plane.XZ):
        with BuildLine():
            Line((14.621138887, 30.235921356), (57.465724426, -31.531393932))
            ThreePointArc((57.465724426, -31.531393932), (59.396767725, -32.773629705), (61.640614875, -32.286569233))
            Line((61.640614875, -32.286569233), (62.051453688, -32.00159297))
            ThreePointArc((62.051453688, -32.00159297), (64.295300838, -31.514532498), (66.226344137, -32.756768271))
            Line((66.226344137, -32.756768271), (22.653502952, 30.060443886))
            ThreePointArc((22.653502952, 30.060443886), (16.200857661, 35.992910672), (7.831109821, 38.596391899))
            Line((7.831109821, 38.596391899), (-1.300237138, 38.830311667))
            ThreePointArc((-1.300237138, 38.830311667), (7.687866321, 36.436435661), (14.621138887, 30.235921356))
        make_face()
    extrude(amount=-WYTNIJ_WYCI_GNI_CIE14_DEPTH, mode=Mode.SUBTRACT)


solid = part.part
